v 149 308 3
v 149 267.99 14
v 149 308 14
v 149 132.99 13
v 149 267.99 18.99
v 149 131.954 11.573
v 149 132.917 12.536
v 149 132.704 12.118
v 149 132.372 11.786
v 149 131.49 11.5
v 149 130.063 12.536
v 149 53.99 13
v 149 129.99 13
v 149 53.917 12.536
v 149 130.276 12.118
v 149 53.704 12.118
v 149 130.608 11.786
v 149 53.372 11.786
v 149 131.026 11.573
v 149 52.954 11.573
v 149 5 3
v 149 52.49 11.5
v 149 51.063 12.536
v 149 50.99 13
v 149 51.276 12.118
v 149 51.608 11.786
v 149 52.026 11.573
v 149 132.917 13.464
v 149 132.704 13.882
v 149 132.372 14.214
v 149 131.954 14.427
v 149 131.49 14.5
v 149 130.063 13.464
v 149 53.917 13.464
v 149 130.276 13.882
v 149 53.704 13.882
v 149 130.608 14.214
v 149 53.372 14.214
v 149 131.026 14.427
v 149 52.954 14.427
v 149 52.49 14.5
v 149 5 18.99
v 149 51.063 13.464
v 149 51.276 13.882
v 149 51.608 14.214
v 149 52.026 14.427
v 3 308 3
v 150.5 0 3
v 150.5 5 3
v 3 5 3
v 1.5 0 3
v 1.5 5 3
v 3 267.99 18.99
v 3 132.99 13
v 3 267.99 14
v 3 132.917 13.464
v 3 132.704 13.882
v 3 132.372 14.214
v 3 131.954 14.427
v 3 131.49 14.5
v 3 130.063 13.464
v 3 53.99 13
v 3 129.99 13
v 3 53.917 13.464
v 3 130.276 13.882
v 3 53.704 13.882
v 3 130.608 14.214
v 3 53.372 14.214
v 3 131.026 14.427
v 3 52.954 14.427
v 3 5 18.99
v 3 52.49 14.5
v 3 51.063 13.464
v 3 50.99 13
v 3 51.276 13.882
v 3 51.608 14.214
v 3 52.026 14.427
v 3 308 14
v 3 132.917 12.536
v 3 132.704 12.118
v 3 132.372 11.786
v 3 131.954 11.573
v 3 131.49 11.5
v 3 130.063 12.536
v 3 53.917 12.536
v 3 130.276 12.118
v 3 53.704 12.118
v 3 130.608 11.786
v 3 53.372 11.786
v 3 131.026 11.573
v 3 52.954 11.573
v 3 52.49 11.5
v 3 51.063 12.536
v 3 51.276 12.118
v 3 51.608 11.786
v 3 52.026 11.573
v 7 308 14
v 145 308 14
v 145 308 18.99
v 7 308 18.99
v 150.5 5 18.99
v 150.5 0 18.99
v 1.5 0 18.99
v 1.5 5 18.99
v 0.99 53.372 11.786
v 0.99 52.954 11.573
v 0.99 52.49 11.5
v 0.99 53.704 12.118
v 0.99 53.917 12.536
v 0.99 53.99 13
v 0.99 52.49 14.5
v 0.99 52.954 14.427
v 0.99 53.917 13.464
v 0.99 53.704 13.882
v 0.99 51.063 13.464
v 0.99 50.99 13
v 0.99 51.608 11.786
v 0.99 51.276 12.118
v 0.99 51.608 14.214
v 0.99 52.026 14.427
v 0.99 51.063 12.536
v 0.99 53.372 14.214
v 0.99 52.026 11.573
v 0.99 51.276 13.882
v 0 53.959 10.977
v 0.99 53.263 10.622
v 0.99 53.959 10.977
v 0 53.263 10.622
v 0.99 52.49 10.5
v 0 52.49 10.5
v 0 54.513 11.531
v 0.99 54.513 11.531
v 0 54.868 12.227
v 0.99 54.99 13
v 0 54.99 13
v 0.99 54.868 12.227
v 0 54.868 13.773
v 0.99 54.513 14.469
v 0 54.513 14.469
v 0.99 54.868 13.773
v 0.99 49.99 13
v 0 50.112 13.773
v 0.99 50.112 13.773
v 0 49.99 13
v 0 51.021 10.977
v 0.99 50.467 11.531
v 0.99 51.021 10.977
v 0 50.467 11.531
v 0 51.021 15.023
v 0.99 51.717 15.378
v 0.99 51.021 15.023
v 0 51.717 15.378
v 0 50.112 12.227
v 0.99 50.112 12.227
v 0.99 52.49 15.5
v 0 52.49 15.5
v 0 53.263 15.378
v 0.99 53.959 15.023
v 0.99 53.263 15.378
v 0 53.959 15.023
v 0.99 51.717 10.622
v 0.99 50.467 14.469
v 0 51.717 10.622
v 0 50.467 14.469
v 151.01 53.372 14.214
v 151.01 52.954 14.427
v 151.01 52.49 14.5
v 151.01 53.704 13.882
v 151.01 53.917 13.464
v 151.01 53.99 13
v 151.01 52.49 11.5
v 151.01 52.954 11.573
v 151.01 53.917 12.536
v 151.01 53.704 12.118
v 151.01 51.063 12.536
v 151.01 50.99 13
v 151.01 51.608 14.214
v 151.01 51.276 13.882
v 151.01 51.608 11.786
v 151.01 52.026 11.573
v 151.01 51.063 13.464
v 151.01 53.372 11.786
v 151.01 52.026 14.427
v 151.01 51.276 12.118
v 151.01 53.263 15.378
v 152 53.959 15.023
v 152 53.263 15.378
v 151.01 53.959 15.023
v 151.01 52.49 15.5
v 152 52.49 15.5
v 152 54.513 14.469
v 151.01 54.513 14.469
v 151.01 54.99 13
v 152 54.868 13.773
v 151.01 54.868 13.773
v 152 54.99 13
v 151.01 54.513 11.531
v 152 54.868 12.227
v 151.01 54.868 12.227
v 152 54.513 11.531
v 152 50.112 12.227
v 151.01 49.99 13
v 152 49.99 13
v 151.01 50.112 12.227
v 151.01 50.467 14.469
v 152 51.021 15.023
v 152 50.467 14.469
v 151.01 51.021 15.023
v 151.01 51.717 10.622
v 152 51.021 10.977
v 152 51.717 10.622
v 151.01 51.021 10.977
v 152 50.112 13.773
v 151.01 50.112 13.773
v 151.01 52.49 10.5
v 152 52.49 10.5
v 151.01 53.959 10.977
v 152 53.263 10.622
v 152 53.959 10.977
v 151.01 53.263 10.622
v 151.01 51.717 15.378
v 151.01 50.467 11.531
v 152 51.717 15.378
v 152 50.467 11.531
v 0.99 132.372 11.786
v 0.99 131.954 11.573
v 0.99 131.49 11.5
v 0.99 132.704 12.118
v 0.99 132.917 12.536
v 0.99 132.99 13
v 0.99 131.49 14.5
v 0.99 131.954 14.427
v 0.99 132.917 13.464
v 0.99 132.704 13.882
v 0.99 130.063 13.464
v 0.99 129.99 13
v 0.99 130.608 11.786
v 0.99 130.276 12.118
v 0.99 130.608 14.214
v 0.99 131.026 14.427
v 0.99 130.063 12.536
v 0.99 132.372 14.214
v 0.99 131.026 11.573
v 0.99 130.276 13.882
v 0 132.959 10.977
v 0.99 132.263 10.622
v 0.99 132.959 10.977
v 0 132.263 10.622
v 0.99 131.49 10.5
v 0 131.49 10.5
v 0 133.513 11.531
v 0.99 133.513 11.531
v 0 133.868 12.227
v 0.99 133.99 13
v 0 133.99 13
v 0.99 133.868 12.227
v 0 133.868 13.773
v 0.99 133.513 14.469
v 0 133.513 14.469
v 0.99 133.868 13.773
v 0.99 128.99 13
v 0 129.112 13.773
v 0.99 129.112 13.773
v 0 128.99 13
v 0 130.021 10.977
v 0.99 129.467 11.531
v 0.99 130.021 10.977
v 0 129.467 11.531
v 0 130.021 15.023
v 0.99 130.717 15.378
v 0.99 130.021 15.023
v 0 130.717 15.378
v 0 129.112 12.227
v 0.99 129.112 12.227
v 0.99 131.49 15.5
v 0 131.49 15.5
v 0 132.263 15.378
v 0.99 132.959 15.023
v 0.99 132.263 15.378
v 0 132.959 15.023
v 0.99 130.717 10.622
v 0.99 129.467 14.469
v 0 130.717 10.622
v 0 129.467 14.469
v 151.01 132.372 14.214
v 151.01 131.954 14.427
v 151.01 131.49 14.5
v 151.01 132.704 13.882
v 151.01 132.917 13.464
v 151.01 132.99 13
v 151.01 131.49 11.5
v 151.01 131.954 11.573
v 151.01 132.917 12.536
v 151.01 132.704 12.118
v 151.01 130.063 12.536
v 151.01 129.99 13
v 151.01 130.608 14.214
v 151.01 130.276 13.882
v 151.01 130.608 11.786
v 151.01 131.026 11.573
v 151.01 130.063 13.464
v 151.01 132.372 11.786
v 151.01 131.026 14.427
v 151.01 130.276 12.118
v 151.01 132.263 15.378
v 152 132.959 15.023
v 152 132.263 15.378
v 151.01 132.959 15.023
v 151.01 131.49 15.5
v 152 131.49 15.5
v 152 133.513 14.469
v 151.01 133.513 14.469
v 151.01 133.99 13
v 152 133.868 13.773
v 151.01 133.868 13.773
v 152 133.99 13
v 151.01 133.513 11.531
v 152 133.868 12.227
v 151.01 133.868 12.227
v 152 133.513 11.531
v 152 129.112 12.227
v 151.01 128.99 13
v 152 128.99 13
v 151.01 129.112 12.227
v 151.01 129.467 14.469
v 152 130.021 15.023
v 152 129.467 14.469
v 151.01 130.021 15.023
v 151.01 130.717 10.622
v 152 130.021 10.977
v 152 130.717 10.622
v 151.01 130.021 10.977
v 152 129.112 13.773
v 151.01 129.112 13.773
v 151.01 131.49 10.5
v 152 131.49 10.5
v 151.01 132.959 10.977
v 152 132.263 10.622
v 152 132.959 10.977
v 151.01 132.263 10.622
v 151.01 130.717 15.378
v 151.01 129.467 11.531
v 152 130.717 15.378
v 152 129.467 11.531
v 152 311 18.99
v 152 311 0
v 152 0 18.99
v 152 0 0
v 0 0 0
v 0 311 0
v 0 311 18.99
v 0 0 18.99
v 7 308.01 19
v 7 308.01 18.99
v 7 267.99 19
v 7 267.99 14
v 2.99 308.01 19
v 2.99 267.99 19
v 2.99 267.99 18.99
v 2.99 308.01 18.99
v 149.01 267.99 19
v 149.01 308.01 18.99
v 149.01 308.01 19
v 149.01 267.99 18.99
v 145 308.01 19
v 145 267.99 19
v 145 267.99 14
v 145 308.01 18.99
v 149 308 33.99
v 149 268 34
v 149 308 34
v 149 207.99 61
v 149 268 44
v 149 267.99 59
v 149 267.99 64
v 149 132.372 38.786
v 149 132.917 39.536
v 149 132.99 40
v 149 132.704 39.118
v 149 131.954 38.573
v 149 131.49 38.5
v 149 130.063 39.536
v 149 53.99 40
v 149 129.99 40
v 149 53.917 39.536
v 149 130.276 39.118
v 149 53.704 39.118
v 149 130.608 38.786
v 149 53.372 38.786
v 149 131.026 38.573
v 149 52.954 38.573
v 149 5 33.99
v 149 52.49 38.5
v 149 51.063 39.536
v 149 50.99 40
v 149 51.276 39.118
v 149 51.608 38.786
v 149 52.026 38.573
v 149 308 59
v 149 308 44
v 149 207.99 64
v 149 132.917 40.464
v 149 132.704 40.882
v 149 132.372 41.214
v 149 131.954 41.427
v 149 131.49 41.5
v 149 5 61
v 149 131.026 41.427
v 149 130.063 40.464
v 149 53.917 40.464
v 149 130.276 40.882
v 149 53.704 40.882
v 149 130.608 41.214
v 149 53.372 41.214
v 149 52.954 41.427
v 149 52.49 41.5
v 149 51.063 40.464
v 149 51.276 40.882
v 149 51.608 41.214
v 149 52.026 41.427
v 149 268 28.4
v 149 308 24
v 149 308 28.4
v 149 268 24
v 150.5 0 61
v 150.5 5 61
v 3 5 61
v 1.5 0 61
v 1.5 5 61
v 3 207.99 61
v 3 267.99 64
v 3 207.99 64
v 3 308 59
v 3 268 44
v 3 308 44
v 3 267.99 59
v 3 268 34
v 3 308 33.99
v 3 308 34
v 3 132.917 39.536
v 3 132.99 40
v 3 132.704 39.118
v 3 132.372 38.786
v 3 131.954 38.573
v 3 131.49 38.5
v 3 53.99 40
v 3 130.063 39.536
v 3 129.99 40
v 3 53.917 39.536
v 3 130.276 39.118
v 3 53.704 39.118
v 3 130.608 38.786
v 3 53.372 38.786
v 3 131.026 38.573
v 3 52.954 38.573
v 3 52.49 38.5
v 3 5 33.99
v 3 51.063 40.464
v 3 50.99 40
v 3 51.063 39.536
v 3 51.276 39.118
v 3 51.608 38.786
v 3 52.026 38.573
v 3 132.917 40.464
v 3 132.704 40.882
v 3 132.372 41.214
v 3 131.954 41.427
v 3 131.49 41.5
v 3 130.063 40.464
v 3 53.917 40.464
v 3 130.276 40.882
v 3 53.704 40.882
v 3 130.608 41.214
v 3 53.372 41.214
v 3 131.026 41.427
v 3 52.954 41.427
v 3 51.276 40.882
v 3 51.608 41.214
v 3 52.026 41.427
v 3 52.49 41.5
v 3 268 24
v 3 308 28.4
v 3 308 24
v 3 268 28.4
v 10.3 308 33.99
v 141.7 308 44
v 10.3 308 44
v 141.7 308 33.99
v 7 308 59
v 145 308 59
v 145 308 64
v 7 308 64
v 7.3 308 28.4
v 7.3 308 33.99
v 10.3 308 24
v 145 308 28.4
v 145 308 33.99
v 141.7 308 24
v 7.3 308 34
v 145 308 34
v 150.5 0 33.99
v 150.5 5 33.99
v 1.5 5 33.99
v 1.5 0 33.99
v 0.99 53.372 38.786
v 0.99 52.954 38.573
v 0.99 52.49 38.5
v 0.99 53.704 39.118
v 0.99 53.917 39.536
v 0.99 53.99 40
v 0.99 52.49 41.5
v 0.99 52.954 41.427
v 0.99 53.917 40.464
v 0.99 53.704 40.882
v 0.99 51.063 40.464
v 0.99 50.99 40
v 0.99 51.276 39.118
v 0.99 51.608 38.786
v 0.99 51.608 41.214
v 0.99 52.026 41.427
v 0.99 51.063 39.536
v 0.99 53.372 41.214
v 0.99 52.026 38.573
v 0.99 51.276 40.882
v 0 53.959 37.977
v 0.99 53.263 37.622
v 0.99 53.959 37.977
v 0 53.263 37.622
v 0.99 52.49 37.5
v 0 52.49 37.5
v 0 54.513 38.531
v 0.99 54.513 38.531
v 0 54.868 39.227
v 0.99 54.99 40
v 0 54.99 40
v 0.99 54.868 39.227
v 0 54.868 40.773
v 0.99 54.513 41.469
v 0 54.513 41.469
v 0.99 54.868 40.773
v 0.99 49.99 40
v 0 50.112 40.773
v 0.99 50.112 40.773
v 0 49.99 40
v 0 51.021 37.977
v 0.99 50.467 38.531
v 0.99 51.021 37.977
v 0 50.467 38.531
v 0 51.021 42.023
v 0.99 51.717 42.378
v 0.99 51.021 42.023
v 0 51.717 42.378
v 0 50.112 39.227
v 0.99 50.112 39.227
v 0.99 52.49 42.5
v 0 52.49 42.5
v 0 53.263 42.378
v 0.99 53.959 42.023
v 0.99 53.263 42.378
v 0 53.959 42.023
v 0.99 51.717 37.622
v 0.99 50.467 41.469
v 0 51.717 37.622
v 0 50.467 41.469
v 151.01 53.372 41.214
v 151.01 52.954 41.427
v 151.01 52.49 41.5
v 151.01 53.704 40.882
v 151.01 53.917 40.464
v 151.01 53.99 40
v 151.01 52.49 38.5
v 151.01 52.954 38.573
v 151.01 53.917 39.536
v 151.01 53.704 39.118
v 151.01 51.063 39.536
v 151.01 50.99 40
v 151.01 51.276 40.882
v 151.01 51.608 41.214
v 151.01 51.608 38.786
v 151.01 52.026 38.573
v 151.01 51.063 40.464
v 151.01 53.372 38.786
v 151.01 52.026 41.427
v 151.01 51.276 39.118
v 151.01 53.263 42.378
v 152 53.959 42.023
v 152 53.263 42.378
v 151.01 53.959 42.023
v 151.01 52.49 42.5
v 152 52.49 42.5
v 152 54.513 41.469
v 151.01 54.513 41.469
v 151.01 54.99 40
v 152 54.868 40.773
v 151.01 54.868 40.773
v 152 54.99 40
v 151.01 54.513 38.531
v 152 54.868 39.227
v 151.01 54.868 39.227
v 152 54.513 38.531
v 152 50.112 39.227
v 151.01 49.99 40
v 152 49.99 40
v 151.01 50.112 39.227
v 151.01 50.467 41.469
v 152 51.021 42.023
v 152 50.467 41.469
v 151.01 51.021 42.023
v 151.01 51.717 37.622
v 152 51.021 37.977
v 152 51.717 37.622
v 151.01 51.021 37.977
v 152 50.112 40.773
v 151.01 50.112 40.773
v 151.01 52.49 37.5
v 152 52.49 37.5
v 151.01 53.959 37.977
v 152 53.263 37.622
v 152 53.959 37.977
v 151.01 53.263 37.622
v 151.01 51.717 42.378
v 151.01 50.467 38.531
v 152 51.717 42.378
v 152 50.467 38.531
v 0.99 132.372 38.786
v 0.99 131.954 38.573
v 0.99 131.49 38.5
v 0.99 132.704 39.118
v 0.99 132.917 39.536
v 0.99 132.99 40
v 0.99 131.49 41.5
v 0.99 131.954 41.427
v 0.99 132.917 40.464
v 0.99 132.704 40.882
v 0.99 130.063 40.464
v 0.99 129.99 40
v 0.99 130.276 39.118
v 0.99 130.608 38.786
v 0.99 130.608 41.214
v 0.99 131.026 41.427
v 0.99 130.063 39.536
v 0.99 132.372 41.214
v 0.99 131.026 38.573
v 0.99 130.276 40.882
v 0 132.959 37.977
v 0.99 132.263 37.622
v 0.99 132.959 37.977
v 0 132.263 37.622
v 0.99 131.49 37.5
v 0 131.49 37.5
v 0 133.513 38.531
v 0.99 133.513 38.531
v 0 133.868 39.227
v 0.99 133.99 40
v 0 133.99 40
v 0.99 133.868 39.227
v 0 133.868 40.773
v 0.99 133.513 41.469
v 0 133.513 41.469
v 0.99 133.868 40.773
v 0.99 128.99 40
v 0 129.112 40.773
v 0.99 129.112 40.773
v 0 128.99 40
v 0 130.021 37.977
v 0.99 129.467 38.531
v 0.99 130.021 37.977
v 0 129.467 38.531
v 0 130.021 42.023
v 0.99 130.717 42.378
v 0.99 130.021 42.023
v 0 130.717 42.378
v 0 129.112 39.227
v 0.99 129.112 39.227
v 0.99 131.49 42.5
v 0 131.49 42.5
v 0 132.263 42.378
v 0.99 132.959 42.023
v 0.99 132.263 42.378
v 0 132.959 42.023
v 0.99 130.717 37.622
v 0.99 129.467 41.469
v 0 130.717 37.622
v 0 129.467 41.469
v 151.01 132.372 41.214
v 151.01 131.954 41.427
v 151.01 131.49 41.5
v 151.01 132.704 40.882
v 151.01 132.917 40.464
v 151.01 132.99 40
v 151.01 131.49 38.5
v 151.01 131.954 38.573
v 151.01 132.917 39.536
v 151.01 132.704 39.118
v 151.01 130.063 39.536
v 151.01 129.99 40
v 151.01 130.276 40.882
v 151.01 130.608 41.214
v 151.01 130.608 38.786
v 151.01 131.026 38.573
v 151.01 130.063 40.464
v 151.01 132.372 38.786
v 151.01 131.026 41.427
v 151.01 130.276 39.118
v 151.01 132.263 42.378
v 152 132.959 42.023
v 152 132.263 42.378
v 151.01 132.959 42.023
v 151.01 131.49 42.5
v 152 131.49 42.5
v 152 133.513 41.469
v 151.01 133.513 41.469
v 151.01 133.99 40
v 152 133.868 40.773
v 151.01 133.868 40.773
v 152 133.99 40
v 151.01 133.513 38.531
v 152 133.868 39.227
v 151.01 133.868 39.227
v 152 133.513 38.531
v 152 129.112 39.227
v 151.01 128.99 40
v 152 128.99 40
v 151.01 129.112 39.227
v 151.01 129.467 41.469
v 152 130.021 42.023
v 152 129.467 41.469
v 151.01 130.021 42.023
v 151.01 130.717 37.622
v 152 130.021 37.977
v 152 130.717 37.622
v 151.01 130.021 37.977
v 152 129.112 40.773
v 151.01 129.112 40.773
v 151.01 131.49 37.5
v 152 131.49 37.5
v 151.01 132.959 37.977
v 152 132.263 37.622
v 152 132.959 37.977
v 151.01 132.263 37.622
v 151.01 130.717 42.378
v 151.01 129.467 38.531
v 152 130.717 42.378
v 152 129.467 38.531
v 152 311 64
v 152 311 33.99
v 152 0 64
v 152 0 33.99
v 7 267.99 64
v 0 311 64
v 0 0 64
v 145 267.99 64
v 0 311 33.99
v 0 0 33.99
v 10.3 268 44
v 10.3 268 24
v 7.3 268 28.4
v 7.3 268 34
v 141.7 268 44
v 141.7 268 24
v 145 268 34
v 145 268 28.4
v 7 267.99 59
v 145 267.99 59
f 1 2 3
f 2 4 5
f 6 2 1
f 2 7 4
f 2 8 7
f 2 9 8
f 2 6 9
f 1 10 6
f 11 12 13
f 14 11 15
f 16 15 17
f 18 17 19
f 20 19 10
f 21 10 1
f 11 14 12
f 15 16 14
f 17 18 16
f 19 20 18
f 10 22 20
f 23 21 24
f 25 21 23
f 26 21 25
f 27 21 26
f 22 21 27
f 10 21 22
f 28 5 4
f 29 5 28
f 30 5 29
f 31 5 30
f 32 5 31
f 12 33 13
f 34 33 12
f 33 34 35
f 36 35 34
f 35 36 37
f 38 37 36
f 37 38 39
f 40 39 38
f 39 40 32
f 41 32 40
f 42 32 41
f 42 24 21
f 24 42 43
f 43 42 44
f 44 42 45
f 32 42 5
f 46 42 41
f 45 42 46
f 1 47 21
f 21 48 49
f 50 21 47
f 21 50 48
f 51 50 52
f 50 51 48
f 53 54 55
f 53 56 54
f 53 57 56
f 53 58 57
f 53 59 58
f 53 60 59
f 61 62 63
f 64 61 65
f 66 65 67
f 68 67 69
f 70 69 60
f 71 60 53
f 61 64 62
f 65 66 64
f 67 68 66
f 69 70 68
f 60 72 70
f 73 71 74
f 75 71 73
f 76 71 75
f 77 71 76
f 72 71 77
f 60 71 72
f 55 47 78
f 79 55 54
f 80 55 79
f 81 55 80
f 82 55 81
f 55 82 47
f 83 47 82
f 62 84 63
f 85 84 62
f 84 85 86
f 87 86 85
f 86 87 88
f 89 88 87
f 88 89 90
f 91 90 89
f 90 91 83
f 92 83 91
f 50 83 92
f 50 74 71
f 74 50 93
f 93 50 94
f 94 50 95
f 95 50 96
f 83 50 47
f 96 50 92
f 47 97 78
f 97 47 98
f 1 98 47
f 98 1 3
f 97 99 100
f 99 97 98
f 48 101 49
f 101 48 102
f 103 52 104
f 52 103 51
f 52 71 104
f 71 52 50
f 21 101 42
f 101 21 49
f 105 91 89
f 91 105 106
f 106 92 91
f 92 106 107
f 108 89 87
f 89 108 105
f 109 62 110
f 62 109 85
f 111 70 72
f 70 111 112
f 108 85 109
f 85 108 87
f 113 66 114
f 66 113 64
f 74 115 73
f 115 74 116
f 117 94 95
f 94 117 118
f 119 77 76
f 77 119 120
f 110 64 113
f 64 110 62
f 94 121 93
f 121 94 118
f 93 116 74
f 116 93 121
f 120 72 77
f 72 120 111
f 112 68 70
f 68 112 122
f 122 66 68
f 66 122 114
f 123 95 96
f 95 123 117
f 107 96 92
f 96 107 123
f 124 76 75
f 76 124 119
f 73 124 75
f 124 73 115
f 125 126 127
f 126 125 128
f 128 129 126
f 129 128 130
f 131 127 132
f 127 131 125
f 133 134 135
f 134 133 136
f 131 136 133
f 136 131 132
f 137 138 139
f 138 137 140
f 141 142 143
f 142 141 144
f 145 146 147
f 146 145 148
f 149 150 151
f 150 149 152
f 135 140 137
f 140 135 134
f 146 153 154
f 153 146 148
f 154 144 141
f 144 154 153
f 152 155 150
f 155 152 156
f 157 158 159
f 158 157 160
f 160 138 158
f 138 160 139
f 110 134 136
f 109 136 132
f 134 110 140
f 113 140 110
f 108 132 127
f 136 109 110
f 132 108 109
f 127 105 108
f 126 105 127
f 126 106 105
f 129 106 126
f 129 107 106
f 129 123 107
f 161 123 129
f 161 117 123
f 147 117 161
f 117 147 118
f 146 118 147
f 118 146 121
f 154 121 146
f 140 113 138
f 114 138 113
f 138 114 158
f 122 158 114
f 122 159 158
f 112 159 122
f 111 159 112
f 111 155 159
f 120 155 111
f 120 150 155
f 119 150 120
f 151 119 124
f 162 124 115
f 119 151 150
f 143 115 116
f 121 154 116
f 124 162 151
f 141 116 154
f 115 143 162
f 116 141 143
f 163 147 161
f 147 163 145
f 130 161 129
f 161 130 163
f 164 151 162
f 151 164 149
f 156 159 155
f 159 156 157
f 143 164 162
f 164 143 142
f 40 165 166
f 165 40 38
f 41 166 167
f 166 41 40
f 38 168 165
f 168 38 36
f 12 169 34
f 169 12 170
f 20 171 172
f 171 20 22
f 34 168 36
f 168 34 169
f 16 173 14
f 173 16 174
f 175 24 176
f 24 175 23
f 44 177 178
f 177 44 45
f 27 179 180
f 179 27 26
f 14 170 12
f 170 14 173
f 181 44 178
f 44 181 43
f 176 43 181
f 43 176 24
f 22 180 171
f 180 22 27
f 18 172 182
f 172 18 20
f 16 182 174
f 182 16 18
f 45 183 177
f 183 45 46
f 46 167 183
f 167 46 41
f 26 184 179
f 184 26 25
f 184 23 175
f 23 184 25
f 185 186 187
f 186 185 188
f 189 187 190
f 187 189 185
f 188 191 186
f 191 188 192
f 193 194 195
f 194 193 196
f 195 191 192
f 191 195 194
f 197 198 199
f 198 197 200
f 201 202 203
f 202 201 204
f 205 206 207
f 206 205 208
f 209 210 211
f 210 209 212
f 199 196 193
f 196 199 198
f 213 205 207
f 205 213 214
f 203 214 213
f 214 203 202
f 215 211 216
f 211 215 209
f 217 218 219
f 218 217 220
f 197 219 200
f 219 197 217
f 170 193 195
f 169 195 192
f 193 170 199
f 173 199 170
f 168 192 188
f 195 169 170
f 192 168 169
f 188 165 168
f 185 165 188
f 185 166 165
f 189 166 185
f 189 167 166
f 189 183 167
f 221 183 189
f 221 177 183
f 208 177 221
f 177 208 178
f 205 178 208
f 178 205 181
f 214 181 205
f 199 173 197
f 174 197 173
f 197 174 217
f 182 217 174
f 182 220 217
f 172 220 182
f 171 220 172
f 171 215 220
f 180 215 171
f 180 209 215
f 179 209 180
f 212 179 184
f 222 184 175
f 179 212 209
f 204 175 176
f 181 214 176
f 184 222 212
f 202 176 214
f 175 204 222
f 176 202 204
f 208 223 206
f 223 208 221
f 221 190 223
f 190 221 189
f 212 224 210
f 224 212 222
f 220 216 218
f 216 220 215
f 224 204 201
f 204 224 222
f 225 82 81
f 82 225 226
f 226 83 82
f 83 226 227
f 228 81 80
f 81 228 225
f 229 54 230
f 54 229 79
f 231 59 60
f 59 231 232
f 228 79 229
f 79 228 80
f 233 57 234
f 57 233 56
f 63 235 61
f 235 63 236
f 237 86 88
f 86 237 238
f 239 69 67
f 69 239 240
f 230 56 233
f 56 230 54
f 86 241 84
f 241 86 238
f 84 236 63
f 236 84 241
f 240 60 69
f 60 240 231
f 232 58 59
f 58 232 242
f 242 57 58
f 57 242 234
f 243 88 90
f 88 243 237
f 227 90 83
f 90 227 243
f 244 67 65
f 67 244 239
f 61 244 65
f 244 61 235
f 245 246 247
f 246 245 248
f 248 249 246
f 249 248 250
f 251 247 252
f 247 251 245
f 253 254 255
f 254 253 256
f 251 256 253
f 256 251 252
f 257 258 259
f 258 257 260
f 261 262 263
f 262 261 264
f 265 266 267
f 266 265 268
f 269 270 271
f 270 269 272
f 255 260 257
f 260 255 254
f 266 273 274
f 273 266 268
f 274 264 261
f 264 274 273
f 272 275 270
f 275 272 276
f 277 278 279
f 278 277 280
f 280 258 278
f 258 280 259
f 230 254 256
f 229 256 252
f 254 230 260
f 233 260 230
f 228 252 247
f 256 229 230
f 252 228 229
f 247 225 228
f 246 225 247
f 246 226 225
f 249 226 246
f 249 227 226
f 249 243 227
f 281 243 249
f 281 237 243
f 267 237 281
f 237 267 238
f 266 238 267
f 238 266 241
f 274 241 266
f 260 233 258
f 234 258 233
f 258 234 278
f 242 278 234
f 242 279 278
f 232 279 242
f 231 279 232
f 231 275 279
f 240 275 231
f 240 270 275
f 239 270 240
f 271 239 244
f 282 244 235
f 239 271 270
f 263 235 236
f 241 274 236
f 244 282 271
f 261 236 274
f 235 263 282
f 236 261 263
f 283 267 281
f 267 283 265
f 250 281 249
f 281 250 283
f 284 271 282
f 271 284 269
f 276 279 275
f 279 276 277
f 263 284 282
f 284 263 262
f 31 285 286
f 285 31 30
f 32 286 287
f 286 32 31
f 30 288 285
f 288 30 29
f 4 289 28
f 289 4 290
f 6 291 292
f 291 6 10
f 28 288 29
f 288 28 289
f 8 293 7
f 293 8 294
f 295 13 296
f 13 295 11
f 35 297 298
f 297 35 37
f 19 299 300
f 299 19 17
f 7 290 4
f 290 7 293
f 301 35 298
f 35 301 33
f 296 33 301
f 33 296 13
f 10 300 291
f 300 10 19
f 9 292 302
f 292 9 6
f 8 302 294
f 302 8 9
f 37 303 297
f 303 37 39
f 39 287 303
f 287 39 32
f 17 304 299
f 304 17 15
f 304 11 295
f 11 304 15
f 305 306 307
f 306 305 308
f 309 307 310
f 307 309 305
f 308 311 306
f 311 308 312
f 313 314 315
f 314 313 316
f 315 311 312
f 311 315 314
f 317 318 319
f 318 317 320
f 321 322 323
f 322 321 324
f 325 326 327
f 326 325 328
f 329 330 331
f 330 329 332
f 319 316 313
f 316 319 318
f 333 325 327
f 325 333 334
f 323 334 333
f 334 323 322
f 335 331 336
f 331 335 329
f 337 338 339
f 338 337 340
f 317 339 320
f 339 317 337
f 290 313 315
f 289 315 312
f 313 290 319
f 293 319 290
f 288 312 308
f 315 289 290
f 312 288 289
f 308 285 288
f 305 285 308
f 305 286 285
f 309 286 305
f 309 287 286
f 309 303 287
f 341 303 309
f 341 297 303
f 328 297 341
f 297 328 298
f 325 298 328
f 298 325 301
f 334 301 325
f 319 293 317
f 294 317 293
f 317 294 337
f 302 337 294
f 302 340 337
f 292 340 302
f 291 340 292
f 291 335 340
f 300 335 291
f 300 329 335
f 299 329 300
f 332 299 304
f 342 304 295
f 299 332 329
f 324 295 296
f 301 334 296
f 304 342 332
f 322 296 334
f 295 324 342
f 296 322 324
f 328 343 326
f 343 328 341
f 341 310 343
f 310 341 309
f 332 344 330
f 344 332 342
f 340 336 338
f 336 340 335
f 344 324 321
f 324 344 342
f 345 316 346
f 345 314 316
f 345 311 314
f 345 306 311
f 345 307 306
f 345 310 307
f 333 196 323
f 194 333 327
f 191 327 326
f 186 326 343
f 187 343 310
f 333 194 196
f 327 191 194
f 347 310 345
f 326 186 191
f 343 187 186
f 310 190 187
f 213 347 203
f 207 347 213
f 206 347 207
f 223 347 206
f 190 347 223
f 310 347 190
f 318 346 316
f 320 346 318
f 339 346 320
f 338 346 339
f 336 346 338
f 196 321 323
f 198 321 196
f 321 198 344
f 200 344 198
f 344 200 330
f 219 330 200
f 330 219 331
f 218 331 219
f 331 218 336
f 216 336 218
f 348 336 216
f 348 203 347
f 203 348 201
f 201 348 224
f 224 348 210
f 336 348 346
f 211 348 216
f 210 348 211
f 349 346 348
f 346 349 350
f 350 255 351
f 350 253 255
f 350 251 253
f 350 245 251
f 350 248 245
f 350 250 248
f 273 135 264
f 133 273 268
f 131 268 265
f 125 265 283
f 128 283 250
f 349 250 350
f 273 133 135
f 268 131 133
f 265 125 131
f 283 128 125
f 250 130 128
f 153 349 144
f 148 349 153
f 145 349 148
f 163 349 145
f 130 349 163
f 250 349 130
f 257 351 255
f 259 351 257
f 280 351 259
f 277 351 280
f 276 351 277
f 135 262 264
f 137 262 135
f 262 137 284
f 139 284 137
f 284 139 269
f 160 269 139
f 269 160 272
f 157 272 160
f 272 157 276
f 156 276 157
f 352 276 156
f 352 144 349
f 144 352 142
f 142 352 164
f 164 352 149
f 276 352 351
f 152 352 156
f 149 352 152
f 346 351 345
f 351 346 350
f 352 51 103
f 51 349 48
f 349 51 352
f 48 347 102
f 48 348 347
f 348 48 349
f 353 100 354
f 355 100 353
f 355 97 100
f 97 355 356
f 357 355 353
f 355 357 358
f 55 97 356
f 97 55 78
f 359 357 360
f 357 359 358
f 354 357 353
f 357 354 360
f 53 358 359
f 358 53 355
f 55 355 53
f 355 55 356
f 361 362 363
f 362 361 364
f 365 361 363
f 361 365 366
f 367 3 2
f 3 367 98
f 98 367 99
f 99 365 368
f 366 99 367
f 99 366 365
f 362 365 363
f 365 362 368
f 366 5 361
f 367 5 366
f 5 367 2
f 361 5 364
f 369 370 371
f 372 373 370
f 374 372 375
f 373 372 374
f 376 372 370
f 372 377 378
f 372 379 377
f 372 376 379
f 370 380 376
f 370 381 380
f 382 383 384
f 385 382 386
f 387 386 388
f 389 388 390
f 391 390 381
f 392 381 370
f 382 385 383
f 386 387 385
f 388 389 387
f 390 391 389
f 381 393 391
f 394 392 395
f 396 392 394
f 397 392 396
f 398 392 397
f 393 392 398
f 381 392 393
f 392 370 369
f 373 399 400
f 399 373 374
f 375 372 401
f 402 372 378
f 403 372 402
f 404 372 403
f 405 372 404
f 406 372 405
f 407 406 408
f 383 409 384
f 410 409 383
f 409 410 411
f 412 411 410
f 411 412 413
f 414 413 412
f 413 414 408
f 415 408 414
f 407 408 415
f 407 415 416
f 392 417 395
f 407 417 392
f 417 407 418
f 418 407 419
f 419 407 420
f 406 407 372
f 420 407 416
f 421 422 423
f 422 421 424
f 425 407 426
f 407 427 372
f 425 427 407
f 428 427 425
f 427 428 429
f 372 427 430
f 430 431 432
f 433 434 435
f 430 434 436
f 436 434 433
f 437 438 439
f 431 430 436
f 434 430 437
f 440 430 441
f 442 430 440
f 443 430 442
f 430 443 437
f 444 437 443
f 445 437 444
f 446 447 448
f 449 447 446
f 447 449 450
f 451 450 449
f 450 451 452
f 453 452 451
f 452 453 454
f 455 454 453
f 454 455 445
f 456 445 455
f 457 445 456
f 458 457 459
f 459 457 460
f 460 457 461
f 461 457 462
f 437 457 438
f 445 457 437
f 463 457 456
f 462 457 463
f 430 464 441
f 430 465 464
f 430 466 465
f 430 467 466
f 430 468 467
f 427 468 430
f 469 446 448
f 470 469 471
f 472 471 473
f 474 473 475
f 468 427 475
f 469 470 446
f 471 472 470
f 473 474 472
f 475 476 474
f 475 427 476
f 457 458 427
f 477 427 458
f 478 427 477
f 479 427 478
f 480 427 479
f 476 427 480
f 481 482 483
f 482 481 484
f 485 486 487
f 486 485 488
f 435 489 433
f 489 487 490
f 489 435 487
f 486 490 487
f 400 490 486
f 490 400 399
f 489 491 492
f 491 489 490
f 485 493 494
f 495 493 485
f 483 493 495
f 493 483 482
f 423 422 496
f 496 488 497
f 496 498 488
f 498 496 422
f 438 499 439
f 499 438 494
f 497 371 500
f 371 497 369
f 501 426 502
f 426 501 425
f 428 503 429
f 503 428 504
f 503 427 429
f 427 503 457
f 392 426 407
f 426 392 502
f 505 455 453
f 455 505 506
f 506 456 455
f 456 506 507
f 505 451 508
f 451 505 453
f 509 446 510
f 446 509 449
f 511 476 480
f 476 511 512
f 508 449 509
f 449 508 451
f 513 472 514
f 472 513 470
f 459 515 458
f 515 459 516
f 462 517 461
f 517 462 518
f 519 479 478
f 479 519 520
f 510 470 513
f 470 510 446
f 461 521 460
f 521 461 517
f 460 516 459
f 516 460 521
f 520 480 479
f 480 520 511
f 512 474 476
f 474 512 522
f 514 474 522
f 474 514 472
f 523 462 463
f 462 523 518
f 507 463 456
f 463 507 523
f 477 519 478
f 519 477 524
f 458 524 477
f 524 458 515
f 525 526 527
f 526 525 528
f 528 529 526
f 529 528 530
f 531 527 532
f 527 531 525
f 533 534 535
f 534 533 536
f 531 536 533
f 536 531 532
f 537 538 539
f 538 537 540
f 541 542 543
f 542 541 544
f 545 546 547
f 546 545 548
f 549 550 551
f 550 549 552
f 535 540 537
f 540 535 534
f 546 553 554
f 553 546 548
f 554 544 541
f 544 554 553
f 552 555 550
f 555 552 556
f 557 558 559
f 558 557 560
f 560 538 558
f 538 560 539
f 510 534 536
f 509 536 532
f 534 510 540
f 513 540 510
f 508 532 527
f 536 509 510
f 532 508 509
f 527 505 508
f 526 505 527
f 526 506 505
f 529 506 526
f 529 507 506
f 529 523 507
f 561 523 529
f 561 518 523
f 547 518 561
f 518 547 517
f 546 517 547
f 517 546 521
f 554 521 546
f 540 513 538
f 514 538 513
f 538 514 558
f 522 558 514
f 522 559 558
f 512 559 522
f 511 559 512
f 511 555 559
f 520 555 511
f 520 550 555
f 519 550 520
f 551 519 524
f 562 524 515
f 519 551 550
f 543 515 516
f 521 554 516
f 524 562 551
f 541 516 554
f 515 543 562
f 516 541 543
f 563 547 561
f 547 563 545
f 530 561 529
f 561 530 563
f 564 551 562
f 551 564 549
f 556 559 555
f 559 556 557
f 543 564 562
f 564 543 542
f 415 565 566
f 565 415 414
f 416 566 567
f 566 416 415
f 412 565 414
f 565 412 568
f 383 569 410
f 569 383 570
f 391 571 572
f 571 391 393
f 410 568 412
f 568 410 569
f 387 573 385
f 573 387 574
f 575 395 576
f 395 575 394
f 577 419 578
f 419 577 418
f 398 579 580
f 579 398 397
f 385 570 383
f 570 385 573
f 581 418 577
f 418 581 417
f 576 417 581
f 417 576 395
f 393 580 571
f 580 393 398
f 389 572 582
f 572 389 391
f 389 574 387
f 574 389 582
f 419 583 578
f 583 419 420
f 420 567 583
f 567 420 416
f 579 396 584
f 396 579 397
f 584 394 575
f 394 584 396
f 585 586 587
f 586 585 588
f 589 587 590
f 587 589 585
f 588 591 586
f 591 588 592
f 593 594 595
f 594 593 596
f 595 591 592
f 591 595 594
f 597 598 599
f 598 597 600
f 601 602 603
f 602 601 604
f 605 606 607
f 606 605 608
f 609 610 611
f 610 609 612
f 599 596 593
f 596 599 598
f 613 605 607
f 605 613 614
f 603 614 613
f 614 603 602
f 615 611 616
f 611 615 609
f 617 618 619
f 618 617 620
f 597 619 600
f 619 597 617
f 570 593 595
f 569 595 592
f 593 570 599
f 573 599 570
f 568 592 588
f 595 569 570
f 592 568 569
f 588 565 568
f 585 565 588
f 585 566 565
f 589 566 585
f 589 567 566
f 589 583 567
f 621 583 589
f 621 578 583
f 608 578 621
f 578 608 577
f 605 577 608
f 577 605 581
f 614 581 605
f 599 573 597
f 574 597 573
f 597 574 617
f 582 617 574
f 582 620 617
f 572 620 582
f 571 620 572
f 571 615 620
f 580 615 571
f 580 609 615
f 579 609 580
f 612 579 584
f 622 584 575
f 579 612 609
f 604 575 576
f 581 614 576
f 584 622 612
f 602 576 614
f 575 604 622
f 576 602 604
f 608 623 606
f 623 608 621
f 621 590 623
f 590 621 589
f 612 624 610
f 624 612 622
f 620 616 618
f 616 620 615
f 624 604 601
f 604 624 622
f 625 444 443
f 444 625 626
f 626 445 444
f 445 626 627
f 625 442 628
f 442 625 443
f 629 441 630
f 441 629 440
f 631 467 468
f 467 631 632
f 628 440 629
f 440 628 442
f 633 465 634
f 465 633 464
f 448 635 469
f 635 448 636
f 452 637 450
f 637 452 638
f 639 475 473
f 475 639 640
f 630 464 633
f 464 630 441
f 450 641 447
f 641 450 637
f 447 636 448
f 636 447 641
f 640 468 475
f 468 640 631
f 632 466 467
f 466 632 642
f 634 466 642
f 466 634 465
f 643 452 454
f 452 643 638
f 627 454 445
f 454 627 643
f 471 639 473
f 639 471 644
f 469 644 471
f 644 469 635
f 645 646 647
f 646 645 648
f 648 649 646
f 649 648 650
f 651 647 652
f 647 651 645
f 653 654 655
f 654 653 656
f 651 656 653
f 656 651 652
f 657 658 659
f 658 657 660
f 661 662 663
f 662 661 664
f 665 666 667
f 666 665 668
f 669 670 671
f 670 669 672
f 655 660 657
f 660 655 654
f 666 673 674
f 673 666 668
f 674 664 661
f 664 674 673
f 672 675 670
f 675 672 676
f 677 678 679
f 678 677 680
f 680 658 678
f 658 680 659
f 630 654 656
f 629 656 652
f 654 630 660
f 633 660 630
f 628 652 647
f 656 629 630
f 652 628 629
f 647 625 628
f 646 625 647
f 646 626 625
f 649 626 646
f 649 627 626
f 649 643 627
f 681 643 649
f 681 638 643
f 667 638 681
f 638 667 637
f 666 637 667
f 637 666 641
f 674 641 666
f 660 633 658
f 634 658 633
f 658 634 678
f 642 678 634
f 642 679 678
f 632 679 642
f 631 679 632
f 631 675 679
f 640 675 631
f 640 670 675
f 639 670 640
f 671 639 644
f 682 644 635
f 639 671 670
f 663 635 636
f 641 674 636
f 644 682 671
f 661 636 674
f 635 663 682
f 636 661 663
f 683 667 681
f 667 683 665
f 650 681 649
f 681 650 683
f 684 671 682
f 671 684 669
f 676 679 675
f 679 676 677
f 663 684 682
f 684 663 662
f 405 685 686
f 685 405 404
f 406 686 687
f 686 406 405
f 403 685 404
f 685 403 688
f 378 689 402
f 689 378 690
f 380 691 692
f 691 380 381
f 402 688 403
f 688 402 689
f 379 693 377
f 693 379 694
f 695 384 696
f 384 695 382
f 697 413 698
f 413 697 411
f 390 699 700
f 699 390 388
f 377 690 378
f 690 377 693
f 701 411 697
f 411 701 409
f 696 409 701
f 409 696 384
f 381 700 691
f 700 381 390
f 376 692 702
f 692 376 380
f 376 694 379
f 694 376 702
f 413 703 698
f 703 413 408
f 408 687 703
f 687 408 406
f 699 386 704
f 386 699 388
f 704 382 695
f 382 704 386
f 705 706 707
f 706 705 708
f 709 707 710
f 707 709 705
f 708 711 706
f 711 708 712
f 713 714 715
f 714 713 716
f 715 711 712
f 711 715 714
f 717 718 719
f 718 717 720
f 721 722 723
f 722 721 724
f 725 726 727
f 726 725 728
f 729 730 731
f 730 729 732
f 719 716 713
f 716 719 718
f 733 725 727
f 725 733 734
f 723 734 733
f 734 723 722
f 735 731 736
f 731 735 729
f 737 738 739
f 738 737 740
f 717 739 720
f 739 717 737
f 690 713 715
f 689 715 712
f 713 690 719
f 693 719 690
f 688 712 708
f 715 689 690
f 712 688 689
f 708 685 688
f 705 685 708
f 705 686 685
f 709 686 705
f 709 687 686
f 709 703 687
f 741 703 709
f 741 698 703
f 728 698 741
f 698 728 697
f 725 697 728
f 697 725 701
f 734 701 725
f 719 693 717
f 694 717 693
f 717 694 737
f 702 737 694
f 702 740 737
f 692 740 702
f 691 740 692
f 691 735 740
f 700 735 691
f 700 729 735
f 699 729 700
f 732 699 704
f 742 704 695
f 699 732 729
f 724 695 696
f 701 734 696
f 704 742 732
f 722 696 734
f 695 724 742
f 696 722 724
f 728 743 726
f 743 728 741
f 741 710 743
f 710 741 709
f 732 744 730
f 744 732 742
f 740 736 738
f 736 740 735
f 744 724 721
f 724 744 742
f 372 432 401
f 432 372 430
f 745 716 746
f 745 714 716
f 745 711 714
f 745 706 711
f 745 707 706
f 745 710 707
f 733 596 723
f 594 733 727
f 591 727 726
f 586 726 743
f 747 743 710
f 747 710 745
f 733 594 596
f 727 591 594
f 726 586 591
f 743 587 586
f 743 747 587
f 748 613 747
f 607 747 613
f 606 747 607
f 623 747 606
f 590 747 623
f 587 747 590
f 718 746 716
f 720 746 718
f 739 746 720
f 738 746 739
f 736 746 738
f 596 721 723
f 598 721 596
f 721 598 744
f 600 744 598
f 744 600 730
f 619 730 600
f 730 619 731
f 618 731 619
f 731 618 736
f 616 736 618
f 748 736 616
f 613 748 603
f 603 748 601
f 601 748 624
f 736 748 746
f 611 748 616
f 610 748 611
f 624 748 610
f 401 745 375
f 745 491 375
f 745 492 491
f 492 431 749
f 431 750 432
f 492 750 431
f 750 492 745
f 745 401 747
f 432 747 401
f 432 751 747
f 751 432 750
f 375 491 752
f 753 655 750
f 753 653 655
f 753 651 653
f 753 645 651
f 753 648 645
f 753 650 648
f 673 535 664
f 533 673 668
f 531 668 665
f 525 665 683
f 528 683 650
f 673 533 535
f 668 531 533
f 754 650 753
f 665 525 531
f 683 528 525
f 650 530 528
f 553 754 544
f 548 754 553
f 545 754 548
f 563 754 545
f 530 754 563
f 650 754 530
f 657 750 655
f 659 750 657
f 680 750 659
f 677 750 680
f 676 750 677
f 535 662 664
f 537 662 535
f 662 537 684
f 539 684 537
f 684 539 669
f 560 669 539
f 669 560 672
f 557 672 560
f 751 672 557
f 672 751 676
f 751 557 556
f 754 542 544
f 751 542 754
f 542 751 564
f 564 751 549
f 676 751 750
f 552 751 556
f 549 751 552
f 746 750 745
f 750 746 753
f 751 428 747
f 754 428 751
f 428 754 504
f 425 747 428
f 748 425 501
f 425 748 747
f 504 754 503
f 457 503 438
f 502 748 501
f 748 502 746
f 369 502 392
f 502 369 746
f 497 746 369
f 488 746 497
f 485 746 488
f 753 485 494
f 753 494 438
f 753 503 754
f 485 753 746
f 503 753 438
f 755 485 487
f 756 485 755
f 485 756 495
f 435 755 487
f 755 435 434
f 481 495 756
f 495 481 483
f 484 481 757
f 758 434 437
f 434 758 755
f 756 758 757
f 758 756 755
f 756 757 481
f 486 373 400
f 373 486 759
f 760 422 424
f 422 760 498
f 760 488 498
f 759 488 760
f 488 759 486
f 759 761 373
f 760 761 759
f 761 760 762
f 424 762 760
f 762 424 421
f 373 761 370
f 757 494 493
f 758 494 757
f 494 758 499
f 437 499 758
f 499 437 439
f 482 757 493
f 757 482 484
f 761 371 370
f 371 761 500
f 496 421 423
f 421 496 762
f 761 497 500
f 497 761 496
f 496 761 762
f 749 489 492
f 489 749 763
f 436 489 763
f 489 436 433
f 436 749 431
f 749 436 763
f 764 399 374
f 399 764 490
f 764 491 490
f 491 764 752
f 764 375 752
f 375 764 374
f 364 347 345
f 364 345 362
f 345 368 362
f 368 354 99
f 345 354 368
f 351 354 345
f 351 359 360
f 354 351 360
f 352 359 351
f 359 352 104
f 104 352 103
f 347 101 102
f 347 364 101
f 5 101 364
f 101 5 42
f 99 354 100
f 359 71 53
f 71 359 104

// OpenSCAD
delta = 0.01;

wall = 3;

// TEAC FD-55GFR 5.25" floppy disk drive.
teac_h = 41.5 + 1.5 /* additional clearance: */;

teac_w = 146; // At side screw mounts.
teac_w_lip = 149; // At front lip.

teac_d_trunk = 100;
teac_d = 208 + teac_d_trunk;
teac_d_lip = 5; // Depth of lip.
teac_d_lip_neg = .5; // Stick out in front of drive.

teac_holes_front_d = 52.5; // From front face.
teac_holes_rear_d = 131.5; // From front face.
teac_holes_mid_d = (teac_holes_front_d + teac_holes_rear_d)/2;
teac_holes_bottom_h = 10; // From bottom face.
teac_holes_top_h = 22; // From bottom face.
teac_holes_center_h = (teac_holes_top_h + teac_holes_bottom_h)/2;

teac_screw_d = 3; // M3.
teac_screw_l = 5; // Length.

teac_screw_head_d = 5;
teac_screw_head_l = 1;

rail_w = 4;
rail_l = 40;
rail_h = 5;

// Material to remove for adjacent interlocking geometry.
rail_overlapgap_w=.3;
rail_overlapgap_h=.6;

preview_sep_z=rail_h*3;

module teac_hole(body_w, d, h) {
    $fn=20; 
    // Left.
    translate([-wall-delta, d, h])
    rotate([0,90,0])
        union() {
            cylinder(teac_screw_l+wall, teac_screw_d/2, teac_screw_d/2);
            cylinder(teac_screw_head_l, teac_screw_head_d/2, teac_screw_head_d/2);
        }

    // Right.
    translate([teac_w+wall+delta, d, h])
    rotate([0,-90,0])
        union() {
            cylinder(teac_screw_l+wall, teac_screw_d/2, teac_screw_d/2);
            cylinder(teac_screw_head_l, teac_screw_head_d/2, teac_screw_head_d/2);
        }
}

module teac_drive() {
    translate([wall, 0, wall])
    union() {
        // Main body.
        cube([teac_w, teac_d, teac_h]);
        
        // Front lip.
        translate([-(teac_w_lip-teac_w)/2, -teac_d_lip_neg, 0])
            cube([teac_w_lip, teac_d_lip+teac_d_lip_neg, teac_h]);
    }
}

module teac_drive_remove() {
    translate([wall, -delta, wall])
    union() {
        // Remove.
        teac_hole(teac_w, teac_holes_front_d,teac_holes_bottom_h);
        teac_hole(teac_w, teac_holes_front_d,teac_holes_top_h);
        teac_hole(teac_w, teac_holes_rear_d,teac_holes_bottom_h);
        teac_hole(teac_w, teac_holes_rear_d,teac_holes_top_h);
        
        // (Incorrectly positioned) front slot.
        translate([5, -delta, (teac_h-5)/2])
            cube([teac_w-10, teac_d-10, 5]);
    }
}

module teac_rails(w, h) {
    // Left rail.
    translate([wall-delta,teac_d-rail_l-delta,wall+teac_holes_center_h-h])
        cube([w+delta,rail_l+2*delta,h]);

    // Right rail.
    translate([wall+teac_w-rail_w,teac_d-rail_l-delta,wall+teac_holes_center_h-h])
        cube([w+delta,rail_l+2*delta,h]);
}

module teac_rail_holders() {
    difference() {
        union() {
            // Left rail.
            translate([wall,teac_d-rail_l,wall+teac_holes_center_h-2*rail_h])
                cube([wall+rail_w+rail_overlapgap_w,rail_l,4*rail_h]);

            // Right rail.
            translate([teac_w-rail_w-rail_overlapgap_w,teac_d-rail_l,wall+teac_holes_center_h-2*rail_h])
                cube([wall+rail_w+rail_overlapgap_w,rail_l,4*rail_h]);
        }

        teac_rails(rail_w+rail_overlapgap_w, rail_h+rail_overlapgap_h);
    }
}

module teac_case(render_front, render_rear, opentop) {
    difference() {
        // Outer body.
        cube([teac_w, teac_d, teac_h] + [2*wall, wall, 2*wall]);

        // Remove.
        union() {
            teac_drive();
            teac_drive_remove();
            if (opentop) {
                translate([wall,teac_d-teac_d_trunk-delta,wall+teac_h-delta])
                cube([teac_w,teac_d_trunk+delta,wall+2*delta]);
            }
            if (!render_rear) {
                translate([-delta, teac_holes_mid_d, 0-delta])
                    cube([
                        teac_w+2*wall+2*delta,
                        teac_d-teac_holes_mid_d+wall+delta,
                        teac_h+2*wall+2*delta
                    ]);
            }
            if (!render_front) {
                translate([-delta, -delta, 0-delta])
                    cube([
                        teac_w+2*wall+2*delta,
                        teac_holes_mid_d+delta,
                        teac_h+2*wall+2*delta
                    ]);
            }
        }
    }
}

module teac_top(render_front, render_rear, opentop) {
    difference() {
        teac_case(render_front, render_rear, opentop);

        // Remove bottom of case;
        translate([-delta, -delta, -delta])
            cube([teac_w, teac_d, teac_holes_center_h]
                + [2*wall+2*delta, wall+2*delta, wall]);
    }

    if (render_rear) {
        teac_rail_holders();
        if (opentop) {
            translate([0,0,teac_h-teac_holes_center_h+wall])
                teac_rails(rail_w, rail_h);
        }
    }
}

module teac_bottom(render_front, render_rear, opentop) {
    difference() {
        teac_case(render_front, render_rear, opentop);

        // Remove top of case;
        translate([-delta, -delta, wall+teac_holes_center_h-delta])
            cube([teac_w, teac_d, teac_h-teac_holes_center_h]
                + [2*wall+2*delta, wall+2*delta, wall+2*delta]);
    }

    teac_rails(rail_w, rail_h);
}

module teac_everything(print,
    render_front, render_rear,
    render_top, render_bottom,
    opentop
) {
    separation = 10;
    
    if (print) {
        if (render_top) {
            translate([separation/2, 0, 0 ])
            translate([0, 0, teac_h+2*wall])
            rotate([0, -180, -90])
            union() {
                teac_top(render_front,render_rear,opentop);
                //%drive();
            }
        }

        if (render_bottom) {
            translate([-separation/2, 0, 0])
            rotate([0, 0, 90])
            union() {
                teac_bottom(render_front, render_rear, opentop);
                //%drive();
            }
        }
    } else {
        if (render_top) {
            translate([0, 0, preview_sep_z])
                teac_top(render_front, render_rear, opentop);
        }
        if (render_bottom) {
            teac_bottom(render_front, render_rear, opentop);
        }
    }
}

teac_everything(print=!true,
    render_front=true, render_rear=true,
    render_top=true, render_bottom=true,
    opentop=true
);
